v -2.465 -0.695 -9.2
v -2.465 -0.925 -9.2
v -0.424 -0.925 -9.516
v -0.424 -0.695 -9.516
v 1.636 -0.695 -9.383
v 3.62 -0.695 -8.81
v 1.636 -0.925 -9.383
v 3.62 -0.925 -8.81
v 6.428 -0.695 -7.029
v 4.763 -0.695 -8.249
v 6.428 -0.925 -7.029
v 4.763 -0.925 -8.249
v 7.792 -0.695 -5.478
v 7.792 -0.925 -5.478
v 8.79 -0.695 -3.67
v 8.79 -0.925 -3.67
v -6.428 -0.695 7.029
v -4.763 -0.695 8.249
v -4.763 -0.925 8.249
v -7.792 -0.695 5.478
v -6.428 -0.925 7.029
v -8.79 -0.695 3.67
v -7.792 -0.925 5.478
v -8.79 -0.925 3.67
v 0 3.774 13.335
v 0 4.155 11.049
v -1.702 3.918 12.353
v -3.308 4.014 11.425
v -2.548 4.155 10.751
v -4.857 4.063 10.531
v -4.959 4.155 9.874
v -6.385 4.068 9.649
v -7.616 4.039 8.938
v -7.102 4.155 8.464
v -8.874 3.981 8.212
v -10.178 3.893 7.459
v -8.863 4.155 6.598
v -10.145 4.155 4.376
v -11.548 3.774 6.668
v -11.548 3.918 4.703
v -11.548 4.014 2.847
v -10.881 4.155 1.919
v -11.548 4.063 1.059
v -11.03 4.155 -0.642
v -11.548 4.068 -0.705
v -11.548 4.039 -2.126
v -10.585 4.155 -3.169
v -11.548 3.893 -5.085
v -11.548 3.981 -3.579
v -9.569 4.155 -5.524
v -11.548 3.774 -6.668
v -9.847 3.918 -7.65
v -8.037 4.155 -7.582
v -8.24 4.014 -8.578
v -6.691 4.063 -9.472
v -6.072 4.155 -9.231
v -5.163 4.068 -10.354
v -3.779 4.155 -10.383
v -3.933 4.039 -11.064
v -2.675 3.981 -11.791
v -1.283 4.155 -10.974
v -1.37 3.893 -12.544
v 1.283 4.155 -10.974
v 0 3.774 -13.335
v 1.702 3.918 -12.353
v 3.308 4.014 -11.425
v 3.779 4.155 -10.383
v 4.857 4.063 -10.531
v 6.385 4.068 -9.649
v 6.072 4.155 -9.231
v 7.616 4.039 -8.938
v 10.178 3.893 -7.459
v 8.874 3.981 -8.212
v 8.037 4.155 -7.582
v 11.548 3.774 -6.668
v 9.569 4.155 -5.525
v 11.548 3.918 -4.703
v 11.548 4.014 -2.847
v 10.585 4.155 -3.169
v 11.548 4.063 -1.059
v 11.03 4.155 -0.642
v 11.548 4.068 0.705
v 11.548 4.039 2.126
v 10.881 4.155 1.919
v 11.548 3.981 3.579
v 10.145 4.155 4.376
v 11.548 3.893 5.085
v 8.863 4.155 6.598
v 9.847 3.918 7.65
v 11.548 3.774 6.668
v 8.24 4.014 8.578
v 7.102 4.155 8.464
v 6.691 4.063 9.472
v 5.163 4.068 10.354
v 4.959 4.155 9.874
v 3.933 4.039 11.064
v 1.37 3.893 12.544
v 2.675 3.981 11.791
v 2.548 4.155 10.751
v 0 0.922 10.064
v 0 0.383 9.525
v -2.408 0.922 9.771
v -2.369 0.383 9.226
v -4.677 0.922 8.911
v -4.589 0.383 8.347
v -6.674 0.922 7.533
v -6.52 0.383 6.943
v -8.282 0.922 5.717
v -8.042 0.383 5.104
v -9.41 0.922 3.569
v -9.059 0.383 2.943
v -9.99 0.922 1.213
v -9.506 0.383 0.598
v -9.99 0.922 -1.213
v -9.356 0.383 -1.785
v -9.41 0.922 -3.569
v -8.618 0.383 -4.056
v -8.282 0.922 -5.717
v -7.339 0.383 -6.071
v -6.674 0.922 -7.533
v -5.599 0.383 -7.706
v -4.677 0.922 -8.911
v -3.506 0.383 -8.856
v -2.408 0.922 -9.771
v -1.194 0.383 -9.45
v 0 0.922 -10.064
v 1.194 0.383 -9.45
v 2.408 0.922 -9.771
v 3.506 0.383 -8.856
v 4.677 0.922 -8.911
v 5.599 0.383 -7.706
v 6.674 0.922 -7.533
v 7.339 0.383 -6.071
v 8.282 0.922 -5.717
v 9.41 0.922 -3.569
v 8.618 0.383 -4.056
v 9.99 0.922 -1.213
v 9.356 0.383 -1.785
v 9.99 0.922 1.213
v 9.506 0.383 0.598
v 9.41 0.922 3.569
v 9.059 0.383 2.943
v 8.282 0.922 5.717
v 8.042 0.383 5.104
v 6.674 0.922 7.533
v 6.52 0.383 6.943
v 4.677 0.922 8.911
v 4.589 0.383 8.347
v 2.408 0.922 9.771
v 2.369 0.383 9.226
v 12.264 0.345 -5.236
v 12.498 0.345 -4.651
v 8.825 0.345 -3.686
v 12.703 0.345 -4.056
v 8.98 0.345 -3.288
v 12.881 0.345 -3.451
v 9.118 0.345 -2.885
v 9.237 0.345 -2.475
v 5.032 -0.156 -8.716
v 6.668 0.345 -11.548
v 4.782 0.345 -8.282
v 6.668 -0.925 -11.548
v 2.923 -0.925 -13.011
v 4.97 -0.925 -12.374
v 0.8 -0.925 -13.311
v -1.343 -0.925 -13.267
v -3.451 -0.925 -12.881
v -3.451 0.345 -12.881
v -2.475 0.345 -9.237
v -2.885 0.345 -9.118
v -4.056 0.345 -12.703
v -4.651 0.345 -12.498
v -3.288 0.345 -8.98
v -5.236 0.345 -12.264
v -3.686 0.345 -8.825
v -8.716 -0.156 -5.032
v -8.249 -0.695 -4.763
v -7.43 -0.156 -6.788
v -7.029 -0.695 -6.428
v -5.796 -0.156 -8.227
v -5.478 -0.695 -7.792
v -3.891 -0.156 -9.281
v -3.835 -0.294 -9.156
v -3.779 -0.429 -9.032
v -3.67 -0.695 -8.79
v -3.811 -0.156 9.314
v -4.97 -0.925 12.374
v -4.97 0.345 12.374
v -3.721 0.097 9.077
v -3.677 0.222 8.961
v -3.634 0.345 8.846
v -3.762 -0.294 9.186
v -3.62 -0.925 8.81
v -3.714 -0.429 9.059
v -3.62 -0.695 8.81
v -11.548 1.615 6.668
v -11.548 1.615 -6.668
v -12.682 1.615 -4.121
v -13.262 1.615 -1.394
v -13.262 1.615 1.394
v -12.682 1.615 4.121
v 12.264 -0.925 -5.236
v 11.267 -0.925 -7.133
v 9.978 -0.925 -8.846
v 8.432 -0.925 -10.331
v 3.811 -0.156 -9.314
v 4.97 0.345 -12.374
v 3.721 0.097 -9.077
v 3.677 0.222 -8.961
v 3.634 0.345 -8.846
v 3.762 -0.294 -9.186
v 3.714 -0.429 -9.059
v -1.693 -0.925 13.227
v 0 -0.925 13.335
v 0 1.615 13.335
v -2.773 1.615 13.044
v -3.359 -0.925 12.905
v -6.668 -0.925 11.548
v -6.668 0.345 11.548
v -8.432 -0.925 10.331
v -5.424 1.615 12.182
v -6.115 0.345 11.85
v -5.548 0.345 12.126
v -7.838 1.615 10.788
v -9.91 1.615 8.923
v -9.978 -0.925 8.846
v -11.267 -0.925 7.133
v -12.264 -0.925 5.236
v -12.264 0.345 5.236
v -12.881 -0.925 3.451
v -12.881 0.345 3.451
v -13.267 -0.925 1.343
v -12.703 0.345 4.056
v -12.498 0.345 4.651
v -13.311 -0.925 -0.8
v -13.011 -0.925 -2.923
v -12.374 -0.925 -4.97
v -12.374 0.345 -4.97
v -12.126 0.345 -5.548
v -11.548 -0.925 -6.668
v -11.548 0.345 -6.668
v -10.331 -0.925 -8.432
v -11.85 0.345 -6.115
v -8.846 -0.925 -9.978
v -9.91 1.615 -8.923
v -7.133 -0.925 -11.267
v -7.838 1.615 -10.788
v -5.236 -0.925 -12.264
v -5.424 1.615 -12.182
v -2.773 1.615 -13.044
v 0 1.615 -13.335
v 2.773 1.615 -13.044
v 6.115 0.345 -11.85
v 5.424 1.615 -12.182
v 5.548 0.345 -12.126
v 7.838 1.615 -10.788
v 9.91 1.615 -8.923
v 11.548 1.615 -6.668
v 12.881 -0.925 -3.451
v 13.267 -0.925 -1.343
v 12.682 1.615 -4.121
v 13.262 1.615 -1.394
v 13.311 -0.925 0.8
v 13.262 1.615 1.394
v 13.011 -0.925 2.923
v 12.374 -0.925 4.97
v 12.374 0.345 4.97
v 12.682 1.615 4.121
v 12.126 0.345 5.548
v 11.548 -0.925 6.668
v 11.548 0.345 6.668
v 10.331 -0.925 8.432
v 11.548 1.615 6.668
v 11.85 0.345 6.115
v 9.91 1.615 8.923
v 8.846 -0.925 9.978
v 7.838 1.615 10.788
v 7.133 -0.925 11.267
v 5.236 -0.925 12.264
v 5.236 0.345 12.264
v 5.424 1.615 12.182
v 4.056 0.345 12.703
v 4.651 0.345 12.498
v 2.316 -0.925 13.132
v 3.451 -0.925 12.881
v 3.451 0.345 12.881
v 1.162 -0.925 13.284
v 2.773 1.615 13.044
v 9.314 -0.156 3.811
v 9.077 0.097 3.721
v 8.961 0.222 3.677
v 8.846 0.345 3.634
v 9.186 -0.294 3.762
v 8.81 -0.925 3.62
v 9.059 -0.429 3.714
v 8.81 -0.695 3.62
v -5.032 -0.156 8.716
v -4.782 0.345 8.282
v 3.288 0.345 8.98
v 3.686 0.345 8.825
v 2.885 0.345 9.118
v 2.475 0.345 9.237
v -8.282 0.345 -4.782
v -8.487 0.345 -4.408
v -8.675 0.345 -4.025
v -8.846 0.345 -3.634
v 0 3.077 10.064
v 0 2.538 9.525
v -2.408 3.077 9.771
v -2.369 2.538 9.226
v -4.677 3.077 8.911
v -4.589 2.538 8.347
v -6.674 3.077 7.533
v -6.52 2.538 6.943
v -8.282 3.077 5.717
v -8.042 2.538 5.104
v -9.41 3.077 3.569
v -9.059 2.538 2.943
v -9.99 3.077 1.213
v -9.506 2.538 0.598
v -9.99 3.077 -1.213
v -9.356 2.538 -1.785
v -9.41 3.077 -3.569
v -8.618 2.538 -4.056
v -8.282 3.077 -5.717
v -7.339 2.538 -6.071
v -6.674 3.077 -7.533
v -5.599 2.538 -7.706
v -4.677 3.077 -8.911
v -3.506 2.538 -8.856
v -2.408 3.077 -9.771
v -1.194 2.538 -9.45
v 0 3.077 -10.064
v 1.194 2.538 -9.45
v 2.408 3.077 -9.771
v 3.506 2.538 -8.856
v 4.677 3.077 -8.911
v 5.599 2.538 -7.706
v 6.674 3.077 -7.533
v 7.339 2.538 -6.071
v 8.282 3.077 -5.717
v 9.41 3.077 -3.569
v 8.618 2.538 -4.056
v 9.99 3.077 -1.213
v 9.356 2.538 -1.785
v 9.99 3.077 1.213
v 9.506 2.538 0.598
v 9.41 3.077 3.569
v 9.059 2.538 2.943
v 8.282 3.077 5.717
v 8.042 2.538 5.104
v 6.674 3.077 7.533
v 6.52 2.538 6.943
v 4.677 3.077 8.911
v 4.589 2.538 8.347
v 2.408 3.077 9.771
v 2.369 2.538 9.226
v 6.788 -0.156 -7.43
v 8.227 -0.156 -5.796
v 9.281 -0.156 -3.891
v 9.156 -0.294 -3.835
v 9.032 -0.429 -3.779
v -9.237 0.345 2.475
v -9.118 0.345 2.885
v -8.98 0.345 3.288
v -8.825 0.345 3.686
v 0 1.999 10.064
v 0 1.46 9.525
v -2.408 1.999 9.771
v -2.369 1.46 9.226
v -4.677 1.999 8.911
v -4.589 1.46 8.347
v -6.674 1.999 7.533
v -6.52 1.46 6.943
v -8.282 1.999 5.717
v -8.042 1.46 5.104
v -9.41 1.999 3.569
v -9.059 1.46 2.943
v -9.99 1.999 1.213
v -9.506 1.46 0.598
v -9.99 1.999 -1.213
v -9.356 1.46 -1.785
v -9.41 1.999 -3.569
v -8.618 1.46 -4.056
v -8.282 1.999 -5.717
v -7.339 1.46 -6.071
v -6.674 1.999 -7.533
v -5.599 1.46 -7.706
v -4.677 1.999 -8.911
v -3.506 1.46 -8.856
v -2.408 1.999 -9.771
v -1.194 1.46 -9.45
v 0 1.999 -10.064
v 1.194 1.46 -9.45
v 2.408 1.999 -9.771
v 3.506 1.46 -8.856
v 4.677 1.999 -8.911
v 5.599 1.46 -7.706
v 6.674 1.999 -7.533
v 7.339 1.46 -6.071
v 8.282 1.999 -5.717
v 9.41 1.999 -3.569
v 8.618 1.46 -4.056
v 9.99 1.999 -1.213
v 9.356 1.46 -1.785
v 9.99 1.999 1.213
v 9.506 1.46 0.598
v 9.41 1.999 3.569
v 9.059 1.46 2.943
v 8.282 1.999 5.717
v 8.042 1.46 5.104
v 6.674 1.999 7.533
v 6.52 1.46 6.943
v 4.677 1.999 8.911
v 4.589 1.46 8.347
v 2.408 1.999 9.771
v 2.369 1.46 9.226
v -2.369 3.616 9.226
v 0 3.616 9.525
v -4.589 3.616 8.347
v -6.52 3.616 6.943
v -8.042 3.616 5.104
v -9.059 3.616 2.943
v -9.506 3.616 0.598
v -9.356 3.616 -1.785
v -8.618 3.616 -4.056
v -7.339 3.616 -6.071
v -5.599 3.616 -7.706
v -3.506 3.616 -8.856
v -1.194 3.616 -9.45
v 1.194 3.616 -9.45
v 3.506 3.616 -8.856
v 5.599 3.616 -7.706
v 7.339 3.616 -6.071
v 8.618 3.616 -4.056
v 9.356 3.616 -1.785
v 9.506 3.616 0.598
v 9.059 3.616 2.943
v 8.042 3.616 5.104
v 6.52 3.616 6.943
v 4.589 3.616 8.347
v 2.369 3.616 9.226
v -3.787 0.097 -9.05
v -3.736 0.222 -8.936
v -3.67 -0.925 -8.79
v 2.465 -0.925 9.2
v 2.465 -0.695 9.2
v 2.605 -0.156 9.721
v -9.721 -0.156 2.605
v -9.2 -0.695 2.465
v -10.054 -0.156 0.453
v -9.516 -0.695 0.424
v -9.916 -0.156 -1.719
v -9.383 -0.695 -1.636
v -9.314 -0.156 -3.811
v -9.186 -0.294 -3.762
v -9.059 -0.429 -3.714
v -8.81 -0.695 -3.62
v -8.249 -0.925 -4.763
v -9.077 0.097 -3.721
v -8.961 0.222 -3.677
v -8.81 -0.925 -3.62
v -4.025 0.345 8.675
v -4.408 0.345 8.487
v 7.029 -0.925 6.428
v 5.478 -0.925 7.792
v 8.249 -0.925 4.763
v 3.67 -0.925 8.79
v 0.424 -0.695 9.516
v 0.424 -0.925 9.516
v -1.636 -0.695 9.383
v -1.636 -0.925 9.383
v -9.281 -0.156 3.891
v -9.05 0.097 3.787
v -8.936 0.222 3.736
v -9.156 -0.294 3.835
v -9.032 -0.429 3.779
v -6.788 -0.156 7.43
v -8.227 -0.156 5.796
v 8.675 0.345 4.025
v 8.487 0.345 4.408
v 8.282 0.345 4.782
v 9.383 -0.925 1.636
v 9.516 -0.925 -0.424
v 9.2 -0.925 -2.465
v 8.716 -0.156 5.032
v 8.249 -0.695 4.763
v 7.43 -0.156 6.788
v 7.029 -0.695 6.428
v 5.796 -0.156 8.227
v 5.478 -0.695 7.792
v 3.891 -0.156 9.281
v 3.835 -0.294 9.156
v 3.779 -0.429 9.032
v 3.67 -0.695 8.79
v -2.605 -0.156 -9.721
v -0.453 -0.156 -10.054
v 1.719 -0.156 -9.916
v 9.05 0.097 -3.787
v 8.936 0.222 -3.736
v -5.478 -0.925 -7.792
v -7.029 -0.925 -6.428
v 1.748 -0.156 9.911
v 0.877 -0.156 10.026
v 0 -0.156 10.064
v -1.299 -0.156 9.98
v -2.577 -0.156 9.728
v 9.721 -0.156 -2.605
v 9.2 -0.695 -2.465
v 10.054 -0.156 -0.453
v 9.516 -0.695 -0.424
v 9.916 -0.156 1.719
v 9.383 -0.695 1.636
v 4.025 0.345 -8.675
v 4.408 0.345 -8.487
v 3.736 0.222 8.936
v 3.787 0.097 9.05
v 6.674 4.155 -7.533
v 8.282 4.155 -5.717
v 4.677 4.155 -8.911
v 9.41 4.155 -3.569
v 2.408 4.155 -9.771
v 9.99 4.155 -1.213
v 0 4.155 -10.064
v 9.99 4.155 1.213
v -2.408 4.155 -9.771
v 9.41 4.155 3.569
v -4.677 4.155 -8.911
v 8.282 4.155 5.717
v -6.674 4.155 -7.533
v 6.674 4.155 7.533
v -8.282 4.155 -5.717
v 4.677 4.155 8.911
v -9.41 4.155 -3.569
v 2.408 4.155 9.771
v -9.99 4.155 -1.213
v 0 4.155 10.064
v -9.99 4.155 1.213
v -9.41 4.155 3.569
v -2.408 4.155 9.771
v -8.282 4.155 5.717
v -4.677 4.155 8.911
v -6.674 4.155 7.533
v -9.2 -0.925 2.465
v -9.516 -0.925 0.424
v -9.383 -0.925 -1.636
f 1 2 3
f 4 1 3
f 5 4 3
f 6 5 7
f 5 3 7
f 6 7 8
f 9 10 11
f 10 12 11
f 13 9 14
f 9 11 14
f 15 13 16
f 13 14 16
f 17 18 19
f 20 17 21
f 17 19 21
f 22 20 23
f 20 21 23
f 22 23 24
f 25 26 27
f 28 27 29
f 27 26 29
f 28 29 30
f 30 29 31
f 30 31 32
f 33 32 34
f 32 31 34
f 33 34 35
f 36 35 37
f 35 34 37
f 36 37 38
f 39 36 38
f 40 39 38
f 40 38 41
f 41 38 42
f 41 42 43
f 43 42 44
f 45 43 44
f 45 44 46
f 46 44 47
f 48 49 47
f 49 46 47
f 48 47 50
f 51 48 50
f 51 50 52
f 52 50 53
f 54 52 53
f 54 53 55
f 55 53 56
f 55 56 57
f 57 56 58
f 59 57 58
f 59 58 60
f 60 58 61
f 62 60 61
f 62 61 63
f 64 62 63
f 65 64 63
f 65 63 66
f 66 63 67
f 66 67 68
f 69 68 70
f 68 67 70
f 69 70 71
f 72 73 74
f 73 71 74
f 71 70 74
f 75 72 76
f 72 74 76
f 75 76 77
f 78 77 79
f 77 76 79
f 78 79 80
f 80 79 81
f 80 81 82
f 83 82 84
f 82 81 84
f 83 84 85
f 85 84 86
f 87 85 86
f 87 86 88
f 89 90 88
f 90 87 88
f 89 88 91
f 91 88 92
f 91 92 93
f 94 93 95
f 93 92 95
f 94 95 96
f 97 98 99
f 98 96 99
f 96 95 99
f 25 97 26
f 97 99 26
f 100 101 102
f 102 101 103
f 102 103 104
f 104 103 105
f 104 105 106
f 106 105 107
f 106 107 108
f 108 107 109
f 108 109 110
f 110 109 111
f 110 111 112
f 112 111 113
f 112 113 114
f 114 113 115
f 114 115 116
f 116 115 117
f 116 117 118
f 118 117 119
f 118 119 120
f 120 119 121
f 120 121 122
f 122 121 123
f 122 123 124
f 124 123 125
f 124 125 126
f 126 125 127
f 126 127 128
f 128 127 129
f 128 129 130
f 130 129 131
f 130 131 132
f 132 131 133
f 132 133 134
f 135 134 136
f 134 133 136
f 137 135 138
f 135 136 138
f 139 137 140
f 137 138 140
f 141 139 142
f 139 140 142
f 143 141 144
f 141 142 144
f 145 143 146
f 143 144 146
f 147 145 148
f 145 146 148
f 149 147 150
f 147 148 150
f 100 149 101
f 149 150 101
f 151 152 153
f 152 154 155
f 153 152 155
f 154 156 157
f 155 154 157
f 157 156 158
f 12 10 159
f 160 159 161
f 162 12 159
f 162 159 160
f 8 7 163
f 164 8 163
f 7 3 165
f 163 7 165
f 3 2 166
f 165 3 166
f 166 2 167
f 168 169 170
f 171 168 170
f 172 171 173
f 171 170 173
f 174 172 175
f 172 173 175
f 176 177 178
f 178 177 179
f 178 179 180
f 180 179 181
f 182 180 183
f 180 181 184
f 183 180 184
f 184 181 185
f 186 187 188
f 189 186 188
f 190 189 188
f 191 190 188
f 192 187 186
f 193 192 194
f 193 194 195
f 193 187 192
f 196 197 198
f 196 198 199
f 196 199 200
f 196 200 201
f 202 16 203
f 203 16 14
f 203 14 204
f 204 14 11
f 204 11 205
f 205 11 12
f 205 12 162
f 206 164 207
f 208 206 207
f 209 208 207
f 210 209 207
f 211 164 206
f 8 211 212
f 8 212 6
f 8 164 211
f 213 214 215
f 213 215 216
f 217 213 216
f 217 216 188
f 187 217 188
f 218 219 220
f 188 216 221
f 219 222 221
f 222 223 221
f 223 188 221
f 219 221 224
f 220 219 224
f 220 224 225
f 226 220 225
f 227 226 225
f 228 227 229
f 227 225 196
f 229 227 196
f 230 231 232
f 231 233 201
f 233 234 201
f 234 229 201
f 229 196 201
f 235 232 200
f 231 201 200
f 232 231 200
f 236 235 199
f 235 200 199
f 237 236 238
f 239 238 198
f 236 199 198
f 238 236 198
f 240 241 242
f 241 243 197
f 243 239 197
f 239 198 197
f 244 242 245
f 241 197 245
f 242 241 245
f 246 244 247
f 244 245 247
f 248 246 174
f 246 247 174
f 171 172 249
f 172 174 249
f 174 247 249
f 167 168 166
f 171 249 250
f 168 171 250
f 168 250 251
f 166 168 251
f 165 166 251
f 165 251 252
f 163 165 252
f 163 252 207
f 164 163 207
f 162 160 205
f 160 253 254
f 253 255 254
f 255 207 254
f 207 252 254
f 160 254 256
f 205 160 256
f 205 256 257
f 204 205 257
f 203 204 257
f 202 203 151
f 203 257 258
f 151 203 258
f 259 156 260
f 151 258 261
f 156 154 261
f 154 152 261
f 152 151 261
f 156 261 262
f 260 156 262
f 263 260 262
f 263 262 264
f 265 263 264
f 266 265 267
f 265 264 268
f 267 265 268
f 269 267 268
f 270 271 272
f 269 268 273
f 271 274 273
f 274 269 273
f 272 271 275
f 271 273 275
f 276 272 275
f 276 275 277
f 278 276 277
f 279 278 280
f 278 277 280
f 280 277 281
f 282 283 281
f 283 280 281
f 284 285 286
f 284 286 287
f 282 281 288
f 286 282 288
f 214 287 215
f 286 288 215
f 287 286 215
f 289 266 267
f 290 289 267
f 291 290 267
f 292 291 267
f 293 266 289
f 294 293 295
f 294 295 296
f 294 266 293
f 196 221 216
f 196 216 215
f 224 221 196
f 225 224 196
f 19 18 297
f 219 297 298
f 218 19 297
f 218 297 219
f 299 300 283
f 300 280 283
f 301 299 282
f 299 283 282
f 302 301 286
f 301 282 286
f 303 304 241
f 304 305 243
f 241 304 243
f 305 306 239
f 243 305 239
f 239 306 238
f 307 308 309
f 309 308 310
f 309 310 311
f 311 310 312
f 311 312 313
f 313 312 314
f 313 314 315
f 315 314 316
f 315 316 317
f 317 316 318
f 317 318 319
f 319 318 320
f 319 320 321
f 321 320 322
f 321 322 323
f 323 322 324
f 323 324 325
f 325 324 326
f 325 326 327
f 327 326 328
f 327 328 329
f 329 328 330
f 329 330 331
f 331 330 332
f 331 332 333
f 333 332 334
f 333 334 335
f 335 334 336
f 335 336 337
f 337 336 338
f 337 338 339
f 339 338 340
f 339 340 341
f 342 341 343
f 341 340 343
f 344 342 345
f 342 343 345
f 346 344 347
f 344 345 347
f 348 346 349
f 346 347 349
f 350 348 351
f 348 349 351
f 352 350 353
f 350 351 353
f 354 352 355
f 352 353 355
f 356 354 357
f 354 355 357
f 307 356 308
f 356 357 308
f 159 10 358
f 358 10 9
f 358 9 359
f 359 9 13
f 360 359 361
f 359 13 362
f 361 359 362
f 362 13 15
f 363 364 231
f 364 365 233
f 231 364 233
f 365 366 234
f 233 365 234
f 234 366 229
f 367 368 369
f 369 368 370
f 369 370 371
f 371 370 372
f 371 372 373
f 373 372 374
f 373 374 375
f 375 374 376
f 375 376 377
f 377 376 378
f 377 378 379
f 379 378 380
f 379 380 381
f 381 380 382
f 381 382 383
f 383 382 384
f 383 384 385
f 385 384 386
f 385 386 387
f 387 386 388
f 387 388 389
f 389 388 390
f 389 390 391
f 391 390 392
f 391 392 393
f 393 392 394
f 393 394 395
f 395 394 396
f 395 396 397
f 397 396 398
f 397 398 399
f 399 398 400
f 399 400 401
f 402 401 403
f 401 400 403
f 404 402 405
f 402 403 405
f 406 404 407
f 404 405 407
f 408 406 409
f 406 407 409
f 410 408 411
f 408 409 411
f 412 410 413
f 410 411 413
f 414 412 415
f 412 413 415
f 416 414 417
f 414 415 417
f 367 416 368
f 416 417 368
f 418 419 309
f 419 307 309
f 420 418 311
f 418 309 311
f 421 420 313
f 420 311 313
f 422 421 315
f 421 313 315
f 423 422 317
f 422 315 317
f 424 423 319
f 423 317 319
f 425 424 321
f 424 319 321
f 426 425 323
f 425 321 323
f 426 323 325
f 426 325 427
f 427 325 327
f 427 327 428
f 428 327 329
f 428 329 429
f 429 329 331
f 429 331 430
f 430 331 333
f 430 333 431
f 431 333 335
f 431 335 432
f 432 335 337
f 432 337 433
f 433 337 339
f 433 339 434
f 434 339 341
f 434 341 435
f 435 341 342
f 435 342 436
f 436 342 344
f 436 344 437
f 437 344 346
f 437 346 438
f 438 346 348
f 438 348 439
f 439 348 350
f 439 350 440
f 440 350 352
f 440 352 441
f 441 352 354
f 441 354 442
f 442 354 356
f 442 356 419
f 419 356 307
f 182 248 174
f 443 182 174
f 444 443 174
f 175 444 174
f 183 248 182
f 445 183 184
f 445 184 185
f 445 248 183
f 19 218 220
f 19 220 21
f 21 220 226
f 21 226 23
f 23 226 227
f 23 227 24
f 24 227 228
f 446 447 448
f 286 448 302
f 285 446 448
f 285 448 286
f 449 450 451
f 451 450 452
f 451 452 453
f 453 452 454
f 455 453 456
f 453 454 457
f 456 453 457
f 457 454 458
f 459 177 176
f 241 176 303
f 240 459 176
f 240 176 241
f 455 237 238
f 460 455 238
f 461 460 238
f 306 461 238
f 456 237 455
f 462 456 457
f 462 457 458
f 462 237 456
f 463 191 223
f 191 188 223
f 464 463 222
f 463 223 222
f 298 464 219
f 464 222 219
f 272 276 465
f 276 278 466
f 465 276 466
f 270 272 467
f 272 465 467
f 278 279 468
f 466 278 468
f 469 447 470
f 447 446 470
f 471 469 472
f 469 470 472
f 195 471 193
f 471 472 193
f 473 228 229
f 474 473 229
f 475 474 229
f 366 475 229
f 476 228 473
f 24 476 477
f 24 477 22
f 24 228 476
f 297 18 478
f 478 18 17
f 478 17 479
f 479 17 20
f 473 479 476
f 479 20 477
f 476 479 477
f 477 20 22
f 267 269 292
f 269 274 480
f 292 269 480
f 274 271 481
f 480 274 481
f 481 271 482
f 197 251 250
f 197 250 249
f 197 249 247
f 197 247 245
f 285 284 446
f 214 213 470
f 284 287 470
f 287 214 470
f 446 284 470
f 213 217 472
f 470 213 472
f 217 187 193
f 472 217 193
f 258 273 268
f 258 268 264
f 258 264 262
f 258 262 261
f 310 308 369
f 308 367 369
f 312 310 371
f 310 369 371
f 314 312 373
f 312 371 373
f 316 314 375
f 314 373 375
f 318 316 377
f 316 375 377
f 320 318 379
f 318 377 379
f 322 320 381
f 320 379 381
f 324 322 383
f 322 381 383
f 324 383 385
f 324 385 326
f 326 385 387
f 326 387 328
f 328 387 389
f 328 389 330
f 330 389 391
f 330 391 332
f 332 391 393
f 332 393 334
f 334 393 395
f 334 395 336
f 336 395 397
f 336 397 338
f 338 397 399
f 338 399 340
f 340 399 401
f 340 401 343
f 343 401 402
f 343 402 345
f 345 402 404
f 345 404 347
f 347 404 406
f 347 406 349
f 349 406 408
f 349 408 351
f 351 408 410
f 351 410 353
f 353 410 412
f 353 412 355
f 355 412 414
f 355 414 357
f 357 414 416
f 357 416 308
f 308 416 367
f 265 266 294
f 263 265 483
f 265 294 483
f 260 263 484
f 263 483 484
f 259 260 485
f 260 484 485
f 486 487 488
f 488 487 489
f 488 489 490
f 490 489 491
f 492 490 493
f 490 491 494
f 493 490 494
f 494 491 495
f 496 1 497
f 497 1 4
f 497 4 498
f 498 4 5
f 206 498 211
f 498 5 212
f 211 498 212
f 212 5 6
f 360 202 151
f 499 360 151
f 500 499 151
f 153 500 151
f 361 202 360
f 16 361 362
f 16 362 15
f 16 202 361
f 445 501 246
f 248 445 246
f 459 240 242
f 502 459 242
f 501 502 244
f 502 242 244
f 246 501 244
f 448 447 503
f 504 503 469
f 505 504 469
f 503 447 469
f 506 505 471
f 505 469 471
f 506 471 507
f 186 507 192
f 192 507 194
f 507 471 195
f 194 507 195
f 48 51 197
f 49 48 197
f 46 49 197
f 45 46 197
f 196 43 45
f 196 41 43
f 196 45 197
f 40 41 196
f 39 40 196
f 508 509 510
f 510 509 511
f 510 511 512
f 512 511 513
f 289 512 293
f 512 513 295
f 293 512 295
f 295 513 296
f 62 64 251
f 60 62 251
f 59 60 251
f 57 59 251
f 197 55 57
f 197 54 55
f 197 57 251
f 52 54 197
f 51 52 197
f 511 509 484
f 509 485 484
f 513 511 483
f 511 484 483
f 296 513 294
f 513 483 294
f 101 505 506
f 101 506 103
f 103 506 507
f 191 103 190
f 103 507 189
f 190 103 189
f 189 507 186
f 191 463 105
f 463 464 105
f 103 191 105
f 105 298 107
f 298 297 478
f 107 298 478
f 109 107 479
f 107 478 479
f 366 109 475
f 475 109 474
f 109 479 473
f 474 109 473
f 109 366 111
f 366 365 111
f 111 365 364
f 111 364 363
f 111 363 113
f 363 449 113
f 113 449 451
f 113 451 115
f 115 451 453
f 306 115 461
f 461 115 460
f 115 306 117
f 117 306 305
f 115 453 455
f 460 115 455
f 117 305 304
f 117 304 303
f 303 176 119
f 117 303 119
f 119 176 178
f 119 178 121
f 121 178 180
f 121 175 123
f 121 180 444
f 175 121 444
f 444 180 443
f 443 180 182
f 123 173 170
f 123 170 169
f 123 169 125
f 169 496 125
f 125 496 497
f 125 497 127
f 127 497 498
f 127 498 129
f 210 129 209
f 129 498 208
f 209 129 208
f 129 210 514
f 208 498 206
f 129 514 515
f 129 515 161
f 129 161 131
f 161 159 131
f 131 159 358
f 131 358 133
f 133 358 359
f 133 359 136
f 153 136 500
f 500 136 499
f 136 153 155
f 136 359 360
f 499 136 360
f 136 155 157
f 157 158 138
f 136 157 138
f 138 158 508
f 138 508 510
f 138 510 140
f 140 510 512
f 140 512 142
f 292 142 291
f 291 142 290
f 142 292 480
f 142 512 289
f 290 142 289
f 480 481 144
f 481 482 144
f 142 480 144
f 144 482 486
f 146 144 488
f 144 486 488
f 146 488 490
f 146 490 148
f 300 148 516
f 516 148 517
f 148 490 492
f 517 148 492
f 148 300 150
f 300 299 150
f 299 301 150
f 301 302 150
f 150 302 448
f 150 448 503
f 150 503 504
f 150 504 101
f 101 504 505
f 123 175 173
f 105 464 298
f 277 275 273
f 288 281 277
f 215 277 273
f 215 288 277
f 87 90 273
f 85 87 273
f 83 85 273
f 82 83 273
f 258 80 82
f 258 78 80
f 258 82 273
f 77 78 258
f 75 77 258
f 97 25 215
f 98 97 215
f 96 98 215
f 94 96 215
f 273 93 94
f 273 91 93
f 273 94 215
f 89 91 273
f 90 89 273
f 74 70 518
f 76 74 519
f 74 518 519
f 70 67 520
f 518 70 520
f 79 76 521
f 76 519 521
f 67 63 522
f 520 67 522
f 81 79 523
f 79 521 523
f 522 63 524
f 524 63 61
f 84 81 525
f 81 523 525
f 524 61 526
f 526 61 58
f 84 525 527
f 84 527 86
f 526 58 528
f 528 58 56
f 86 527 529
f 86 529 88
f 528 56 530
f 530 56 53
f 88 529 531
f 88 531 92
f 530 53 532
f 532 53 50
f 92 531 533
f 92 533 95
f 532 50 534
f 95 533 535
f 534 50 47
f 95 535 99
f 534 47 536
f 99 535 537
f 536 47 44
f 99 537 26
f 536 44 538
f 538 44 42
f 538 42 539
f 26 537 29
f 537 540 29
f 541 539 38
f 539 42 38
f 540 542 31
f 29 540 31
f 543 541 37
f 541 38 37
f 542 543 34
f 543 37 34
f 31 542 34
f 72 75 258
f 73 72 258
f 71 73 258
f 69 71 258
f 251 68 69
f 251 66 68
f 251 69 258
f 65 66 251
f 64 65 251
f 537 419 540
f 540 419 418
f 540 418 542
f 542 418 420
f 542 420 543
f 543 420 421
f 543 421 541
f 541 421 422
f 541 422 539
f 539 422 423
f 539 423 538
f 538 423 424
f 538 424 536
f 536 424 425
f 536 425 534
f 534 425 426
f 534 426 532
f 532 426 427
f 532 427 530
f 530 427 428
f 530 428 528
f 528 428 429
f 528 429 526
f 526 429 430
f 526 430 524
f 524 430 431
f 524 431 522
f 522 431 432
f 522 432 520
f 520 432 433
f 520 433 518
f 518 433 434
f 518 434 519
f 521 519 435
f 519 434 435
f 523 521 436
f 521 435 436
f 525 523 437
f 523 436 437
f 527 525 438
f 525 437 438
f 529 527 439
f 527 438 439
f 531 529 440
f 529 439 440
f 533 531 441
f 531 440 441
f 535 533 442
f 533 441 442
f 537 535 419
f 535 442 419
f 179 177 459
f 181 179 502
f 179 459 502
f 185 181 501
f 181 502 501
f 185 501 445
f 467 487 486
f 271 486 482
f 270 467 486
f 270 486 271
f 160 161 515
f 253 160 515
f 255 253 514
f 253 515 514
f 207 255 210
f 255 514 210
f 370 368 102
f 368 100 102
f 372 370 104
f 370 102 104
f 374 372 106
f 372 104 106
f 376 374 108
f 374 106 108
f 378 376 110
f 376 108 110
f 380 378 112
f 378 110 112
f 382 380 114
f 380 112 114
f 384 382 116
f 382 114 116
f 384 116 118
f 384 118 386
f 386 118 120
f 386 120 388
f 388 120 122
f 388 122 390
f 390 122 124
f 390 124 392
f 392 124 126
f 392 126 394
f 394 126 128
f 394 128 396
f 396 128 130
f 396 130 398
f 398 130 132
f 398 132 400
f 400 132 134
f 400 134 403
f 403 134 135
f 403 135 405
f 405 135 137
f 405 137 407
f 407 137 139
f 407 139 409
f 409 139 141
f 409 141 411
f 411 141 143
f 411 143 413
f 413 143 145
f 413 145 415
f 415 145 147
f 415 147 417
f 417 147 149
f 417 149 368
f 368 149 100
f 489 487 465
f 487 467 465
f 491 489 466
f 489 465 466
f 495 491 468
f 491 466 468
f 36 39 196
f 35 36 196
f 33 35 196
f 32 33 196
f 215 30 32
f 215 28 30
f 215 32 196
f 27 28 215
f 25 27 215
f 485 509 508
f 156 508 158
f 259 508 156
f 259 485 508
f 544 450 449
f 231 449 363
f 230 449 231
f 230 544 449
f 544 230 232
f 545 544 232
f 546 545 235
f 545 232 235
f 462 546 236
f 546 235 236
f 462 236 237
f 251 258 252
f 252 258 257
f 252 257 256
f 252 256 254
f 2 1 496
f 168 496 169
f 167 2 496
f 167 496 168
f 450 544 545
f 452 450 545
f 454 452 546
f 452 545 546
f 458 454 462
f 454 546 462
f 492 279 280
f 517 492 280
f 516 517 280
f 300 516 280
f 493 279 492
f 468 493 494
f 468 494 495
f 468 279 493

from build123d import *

# Parameters (mm, degrees)
SKETCH2_OUTSIDE_W  = 36.282
SKETCH2_OUTSIDE_H  = 36.282
CUT_EXTRUDE1_DEPTH = 2.54
CUT_EXTRUDE2_DEPTH = 1.27


with BuildPart() as part:
    # Sketch1 → Revolve1 (revolve)
    with BuildSketch(Plane(origin=(0, 0, 0), x_dir=(0, 0, -1), z_dir=(1, 0, 0)), mode=Mode.PRIVATE) as revolve1_sk:
        Polygon((9.525, -0.925479408), (13.335, -0.925479408), (13.335, 3.773520592), (11.049, 4.154520592), (10.063815367, 4.154520592), (9.525, 3.615705224), (10.063815367, 3.076889857), (9.525, 2.53807449), (10.063815367, 1.999259122), (9.525, 1.460443755), (10.063815367, 0.921628388), (9.525, 0.382813021), (10.063815367, -0.156002347), (9.525, -0.694817714), align=None)
    revolve(revolve1_sk.sketch.rotate(Axis((0, 15.090367901, 0), (0, -1, 0)), 180), axis=Axis((0, 15.090367901, 0), (0, -1, 0)))

    # Sketch2 outside → Cut-Extrude1 (cut)
    with BuildSketch(Plane(origin=(0, 4.154520592, 0), x_dir=(-1, 0, 0), z_dir=(0, 1, 0))):
        Rectangle(SKETCH2_OUTSIDE_W, SKETCH2_OUTSIDE_H)
        Polygon((0, -13.335), (11.548448759, -6.6675), (11.548448759, 6.6675), (0, 13.335), (-11.548448759, 6.6675), (-11.548448759, -6.6675), align=None, mode=Mode.SUBTRACT)
    extrude(amount=-CUT_EXTRUDE1_DEPTH, mode=Mode.SUBTRACT)

    # Sketch3 → Cut-Extrude2 (cut)
    with BuildSketch(Plane.XZ.offset(0.925479408)):
        with BuildLine():
            Line((-4.7625, 8.248891971), (-6.6675, 11.548448759))
            ThreePointArc((-6.6675, 11.548448759), (-5.833267647, 11.991464196), (-4.969767422, 12.374313588))
            Line((-4.969767422, 12.374313588), (-3.620124564, 8.810239675))
            ThreePointArc((-3.620124564, 8.810239675), (-4.20069952, 8.548669402), (-4.7625, 8.248891971))
        make_face()
        with BuildLine():
            Line((2.465251405, 9.200443495), (3.451351966, 12.880620894))
            ThreePointArc((3.451351966, 12.880620894), (4.354502539, 12.603988759), (5.235804805, 12.264117296))
            Line((5.235804805, 12.264117296), (3.66996559, 8.789594847))
            ThreePointArc((3.66996559, 8.789594847), (3.074478988, 9.015165221), (2.465251405, 9.200443495))
        make_face()
        with BuildLine():
            Line((8.248891971, 4.7625), (11.548448759, 6.6675))
            ThreePointArc((11.548448759, 6.6675), (11.991464196, 5.833267647), (12.374313588, 4.969767422))
            Line((12.374313588, 4.969767422), (8.810239675, 3.620124564))
            ThreePointArc((8.810239675, 3.620124564), (8.548669402, 4.20069952), (8.248891971, 4.7625))
        make_face()
        with BuildLine():
            Line((9.200443495, -2.465251405), (12.880620894, -3.451351966))
            ThreePointArc((12.880620894, -3.451351966), (12.603988759, -4.354502539), (12.264117296, -5.235804805))
            Line((12.264117296, -5.235804805), (8.789594847, -3.66996559))
            ThreePointArc((8.789594847, -3.66996559), (9.015165221, -3.074478988), (9.200443495, -2.465251405))
        make_face()
        with BuildLine():
            Line((4.7625, -8.248891971), (6.6675, -11.548448759))
            ThreePointArc((6.6675, -11.548448759), (5.833267647, -11.991464196), (4.969767422, -12.374313588))
            Line((4.969767422, -12.374313588), (3.620124564, -8.810239675))
            ThreePointArc((3.620124564, -8.810239675), (4.20069952, -8.548669402), (4.7625, -8.248891971))
        make_face()
        with BuildLine():
            Line((-2.465251405, -9.200443495), (-3.451351966, -12.880620894))
            ThreePointArc((-3.451351966, -12.880620894), (-4.354502539, -12.603988759), (-5.235804805, -12.264117296))
            Line((-5.235804805, -12.264117296), (-3.66996559, -8.789594847))
            ThreePointArc((-3.66996559, -8.789594847), (-3.074478988, -9.015165221), (-2.465251405, -9.200443495))
        make_face()
        with BuildLine():
            Line((-8.248891971, -4.7625), (-11.548448759, -6.6675))
            ThreePointArc((-11.548448759, -6.6675), (-11.991464196, -5.833267647), (-12.374313588, -4.969767422))
            Line((-12.374313588, -4.969767422), (-8.810239675, -3.620124564))
            ThreePointArc((-8.810239675, -3.620124564), (-8.548669402, -4.20069952), (-8.248891971, -4.7625))
        make_face()
        with BuildLine():
            Line((-9.200443495, 2.465251405), (-12.880620894, 3.451351966))
            ThreePointArc((-12.880620894, 3.451351966), (-12.603988759, 4.354502539), (-12.264117296, 5.235804805))
            Line((-12.264117296, 5.235804805), (-8.789594847, 3.66996559))
            ThreePointArc((-8.789594847, 3.66996559), (-9.015165221, 3.074478988), (-9.200443495, 2.465251405))
        make_face()
    extrude(amount=-CUT_EXTRUDE2_DEPTH, mode=Mode.SUBTRACT)


solid = part.part
